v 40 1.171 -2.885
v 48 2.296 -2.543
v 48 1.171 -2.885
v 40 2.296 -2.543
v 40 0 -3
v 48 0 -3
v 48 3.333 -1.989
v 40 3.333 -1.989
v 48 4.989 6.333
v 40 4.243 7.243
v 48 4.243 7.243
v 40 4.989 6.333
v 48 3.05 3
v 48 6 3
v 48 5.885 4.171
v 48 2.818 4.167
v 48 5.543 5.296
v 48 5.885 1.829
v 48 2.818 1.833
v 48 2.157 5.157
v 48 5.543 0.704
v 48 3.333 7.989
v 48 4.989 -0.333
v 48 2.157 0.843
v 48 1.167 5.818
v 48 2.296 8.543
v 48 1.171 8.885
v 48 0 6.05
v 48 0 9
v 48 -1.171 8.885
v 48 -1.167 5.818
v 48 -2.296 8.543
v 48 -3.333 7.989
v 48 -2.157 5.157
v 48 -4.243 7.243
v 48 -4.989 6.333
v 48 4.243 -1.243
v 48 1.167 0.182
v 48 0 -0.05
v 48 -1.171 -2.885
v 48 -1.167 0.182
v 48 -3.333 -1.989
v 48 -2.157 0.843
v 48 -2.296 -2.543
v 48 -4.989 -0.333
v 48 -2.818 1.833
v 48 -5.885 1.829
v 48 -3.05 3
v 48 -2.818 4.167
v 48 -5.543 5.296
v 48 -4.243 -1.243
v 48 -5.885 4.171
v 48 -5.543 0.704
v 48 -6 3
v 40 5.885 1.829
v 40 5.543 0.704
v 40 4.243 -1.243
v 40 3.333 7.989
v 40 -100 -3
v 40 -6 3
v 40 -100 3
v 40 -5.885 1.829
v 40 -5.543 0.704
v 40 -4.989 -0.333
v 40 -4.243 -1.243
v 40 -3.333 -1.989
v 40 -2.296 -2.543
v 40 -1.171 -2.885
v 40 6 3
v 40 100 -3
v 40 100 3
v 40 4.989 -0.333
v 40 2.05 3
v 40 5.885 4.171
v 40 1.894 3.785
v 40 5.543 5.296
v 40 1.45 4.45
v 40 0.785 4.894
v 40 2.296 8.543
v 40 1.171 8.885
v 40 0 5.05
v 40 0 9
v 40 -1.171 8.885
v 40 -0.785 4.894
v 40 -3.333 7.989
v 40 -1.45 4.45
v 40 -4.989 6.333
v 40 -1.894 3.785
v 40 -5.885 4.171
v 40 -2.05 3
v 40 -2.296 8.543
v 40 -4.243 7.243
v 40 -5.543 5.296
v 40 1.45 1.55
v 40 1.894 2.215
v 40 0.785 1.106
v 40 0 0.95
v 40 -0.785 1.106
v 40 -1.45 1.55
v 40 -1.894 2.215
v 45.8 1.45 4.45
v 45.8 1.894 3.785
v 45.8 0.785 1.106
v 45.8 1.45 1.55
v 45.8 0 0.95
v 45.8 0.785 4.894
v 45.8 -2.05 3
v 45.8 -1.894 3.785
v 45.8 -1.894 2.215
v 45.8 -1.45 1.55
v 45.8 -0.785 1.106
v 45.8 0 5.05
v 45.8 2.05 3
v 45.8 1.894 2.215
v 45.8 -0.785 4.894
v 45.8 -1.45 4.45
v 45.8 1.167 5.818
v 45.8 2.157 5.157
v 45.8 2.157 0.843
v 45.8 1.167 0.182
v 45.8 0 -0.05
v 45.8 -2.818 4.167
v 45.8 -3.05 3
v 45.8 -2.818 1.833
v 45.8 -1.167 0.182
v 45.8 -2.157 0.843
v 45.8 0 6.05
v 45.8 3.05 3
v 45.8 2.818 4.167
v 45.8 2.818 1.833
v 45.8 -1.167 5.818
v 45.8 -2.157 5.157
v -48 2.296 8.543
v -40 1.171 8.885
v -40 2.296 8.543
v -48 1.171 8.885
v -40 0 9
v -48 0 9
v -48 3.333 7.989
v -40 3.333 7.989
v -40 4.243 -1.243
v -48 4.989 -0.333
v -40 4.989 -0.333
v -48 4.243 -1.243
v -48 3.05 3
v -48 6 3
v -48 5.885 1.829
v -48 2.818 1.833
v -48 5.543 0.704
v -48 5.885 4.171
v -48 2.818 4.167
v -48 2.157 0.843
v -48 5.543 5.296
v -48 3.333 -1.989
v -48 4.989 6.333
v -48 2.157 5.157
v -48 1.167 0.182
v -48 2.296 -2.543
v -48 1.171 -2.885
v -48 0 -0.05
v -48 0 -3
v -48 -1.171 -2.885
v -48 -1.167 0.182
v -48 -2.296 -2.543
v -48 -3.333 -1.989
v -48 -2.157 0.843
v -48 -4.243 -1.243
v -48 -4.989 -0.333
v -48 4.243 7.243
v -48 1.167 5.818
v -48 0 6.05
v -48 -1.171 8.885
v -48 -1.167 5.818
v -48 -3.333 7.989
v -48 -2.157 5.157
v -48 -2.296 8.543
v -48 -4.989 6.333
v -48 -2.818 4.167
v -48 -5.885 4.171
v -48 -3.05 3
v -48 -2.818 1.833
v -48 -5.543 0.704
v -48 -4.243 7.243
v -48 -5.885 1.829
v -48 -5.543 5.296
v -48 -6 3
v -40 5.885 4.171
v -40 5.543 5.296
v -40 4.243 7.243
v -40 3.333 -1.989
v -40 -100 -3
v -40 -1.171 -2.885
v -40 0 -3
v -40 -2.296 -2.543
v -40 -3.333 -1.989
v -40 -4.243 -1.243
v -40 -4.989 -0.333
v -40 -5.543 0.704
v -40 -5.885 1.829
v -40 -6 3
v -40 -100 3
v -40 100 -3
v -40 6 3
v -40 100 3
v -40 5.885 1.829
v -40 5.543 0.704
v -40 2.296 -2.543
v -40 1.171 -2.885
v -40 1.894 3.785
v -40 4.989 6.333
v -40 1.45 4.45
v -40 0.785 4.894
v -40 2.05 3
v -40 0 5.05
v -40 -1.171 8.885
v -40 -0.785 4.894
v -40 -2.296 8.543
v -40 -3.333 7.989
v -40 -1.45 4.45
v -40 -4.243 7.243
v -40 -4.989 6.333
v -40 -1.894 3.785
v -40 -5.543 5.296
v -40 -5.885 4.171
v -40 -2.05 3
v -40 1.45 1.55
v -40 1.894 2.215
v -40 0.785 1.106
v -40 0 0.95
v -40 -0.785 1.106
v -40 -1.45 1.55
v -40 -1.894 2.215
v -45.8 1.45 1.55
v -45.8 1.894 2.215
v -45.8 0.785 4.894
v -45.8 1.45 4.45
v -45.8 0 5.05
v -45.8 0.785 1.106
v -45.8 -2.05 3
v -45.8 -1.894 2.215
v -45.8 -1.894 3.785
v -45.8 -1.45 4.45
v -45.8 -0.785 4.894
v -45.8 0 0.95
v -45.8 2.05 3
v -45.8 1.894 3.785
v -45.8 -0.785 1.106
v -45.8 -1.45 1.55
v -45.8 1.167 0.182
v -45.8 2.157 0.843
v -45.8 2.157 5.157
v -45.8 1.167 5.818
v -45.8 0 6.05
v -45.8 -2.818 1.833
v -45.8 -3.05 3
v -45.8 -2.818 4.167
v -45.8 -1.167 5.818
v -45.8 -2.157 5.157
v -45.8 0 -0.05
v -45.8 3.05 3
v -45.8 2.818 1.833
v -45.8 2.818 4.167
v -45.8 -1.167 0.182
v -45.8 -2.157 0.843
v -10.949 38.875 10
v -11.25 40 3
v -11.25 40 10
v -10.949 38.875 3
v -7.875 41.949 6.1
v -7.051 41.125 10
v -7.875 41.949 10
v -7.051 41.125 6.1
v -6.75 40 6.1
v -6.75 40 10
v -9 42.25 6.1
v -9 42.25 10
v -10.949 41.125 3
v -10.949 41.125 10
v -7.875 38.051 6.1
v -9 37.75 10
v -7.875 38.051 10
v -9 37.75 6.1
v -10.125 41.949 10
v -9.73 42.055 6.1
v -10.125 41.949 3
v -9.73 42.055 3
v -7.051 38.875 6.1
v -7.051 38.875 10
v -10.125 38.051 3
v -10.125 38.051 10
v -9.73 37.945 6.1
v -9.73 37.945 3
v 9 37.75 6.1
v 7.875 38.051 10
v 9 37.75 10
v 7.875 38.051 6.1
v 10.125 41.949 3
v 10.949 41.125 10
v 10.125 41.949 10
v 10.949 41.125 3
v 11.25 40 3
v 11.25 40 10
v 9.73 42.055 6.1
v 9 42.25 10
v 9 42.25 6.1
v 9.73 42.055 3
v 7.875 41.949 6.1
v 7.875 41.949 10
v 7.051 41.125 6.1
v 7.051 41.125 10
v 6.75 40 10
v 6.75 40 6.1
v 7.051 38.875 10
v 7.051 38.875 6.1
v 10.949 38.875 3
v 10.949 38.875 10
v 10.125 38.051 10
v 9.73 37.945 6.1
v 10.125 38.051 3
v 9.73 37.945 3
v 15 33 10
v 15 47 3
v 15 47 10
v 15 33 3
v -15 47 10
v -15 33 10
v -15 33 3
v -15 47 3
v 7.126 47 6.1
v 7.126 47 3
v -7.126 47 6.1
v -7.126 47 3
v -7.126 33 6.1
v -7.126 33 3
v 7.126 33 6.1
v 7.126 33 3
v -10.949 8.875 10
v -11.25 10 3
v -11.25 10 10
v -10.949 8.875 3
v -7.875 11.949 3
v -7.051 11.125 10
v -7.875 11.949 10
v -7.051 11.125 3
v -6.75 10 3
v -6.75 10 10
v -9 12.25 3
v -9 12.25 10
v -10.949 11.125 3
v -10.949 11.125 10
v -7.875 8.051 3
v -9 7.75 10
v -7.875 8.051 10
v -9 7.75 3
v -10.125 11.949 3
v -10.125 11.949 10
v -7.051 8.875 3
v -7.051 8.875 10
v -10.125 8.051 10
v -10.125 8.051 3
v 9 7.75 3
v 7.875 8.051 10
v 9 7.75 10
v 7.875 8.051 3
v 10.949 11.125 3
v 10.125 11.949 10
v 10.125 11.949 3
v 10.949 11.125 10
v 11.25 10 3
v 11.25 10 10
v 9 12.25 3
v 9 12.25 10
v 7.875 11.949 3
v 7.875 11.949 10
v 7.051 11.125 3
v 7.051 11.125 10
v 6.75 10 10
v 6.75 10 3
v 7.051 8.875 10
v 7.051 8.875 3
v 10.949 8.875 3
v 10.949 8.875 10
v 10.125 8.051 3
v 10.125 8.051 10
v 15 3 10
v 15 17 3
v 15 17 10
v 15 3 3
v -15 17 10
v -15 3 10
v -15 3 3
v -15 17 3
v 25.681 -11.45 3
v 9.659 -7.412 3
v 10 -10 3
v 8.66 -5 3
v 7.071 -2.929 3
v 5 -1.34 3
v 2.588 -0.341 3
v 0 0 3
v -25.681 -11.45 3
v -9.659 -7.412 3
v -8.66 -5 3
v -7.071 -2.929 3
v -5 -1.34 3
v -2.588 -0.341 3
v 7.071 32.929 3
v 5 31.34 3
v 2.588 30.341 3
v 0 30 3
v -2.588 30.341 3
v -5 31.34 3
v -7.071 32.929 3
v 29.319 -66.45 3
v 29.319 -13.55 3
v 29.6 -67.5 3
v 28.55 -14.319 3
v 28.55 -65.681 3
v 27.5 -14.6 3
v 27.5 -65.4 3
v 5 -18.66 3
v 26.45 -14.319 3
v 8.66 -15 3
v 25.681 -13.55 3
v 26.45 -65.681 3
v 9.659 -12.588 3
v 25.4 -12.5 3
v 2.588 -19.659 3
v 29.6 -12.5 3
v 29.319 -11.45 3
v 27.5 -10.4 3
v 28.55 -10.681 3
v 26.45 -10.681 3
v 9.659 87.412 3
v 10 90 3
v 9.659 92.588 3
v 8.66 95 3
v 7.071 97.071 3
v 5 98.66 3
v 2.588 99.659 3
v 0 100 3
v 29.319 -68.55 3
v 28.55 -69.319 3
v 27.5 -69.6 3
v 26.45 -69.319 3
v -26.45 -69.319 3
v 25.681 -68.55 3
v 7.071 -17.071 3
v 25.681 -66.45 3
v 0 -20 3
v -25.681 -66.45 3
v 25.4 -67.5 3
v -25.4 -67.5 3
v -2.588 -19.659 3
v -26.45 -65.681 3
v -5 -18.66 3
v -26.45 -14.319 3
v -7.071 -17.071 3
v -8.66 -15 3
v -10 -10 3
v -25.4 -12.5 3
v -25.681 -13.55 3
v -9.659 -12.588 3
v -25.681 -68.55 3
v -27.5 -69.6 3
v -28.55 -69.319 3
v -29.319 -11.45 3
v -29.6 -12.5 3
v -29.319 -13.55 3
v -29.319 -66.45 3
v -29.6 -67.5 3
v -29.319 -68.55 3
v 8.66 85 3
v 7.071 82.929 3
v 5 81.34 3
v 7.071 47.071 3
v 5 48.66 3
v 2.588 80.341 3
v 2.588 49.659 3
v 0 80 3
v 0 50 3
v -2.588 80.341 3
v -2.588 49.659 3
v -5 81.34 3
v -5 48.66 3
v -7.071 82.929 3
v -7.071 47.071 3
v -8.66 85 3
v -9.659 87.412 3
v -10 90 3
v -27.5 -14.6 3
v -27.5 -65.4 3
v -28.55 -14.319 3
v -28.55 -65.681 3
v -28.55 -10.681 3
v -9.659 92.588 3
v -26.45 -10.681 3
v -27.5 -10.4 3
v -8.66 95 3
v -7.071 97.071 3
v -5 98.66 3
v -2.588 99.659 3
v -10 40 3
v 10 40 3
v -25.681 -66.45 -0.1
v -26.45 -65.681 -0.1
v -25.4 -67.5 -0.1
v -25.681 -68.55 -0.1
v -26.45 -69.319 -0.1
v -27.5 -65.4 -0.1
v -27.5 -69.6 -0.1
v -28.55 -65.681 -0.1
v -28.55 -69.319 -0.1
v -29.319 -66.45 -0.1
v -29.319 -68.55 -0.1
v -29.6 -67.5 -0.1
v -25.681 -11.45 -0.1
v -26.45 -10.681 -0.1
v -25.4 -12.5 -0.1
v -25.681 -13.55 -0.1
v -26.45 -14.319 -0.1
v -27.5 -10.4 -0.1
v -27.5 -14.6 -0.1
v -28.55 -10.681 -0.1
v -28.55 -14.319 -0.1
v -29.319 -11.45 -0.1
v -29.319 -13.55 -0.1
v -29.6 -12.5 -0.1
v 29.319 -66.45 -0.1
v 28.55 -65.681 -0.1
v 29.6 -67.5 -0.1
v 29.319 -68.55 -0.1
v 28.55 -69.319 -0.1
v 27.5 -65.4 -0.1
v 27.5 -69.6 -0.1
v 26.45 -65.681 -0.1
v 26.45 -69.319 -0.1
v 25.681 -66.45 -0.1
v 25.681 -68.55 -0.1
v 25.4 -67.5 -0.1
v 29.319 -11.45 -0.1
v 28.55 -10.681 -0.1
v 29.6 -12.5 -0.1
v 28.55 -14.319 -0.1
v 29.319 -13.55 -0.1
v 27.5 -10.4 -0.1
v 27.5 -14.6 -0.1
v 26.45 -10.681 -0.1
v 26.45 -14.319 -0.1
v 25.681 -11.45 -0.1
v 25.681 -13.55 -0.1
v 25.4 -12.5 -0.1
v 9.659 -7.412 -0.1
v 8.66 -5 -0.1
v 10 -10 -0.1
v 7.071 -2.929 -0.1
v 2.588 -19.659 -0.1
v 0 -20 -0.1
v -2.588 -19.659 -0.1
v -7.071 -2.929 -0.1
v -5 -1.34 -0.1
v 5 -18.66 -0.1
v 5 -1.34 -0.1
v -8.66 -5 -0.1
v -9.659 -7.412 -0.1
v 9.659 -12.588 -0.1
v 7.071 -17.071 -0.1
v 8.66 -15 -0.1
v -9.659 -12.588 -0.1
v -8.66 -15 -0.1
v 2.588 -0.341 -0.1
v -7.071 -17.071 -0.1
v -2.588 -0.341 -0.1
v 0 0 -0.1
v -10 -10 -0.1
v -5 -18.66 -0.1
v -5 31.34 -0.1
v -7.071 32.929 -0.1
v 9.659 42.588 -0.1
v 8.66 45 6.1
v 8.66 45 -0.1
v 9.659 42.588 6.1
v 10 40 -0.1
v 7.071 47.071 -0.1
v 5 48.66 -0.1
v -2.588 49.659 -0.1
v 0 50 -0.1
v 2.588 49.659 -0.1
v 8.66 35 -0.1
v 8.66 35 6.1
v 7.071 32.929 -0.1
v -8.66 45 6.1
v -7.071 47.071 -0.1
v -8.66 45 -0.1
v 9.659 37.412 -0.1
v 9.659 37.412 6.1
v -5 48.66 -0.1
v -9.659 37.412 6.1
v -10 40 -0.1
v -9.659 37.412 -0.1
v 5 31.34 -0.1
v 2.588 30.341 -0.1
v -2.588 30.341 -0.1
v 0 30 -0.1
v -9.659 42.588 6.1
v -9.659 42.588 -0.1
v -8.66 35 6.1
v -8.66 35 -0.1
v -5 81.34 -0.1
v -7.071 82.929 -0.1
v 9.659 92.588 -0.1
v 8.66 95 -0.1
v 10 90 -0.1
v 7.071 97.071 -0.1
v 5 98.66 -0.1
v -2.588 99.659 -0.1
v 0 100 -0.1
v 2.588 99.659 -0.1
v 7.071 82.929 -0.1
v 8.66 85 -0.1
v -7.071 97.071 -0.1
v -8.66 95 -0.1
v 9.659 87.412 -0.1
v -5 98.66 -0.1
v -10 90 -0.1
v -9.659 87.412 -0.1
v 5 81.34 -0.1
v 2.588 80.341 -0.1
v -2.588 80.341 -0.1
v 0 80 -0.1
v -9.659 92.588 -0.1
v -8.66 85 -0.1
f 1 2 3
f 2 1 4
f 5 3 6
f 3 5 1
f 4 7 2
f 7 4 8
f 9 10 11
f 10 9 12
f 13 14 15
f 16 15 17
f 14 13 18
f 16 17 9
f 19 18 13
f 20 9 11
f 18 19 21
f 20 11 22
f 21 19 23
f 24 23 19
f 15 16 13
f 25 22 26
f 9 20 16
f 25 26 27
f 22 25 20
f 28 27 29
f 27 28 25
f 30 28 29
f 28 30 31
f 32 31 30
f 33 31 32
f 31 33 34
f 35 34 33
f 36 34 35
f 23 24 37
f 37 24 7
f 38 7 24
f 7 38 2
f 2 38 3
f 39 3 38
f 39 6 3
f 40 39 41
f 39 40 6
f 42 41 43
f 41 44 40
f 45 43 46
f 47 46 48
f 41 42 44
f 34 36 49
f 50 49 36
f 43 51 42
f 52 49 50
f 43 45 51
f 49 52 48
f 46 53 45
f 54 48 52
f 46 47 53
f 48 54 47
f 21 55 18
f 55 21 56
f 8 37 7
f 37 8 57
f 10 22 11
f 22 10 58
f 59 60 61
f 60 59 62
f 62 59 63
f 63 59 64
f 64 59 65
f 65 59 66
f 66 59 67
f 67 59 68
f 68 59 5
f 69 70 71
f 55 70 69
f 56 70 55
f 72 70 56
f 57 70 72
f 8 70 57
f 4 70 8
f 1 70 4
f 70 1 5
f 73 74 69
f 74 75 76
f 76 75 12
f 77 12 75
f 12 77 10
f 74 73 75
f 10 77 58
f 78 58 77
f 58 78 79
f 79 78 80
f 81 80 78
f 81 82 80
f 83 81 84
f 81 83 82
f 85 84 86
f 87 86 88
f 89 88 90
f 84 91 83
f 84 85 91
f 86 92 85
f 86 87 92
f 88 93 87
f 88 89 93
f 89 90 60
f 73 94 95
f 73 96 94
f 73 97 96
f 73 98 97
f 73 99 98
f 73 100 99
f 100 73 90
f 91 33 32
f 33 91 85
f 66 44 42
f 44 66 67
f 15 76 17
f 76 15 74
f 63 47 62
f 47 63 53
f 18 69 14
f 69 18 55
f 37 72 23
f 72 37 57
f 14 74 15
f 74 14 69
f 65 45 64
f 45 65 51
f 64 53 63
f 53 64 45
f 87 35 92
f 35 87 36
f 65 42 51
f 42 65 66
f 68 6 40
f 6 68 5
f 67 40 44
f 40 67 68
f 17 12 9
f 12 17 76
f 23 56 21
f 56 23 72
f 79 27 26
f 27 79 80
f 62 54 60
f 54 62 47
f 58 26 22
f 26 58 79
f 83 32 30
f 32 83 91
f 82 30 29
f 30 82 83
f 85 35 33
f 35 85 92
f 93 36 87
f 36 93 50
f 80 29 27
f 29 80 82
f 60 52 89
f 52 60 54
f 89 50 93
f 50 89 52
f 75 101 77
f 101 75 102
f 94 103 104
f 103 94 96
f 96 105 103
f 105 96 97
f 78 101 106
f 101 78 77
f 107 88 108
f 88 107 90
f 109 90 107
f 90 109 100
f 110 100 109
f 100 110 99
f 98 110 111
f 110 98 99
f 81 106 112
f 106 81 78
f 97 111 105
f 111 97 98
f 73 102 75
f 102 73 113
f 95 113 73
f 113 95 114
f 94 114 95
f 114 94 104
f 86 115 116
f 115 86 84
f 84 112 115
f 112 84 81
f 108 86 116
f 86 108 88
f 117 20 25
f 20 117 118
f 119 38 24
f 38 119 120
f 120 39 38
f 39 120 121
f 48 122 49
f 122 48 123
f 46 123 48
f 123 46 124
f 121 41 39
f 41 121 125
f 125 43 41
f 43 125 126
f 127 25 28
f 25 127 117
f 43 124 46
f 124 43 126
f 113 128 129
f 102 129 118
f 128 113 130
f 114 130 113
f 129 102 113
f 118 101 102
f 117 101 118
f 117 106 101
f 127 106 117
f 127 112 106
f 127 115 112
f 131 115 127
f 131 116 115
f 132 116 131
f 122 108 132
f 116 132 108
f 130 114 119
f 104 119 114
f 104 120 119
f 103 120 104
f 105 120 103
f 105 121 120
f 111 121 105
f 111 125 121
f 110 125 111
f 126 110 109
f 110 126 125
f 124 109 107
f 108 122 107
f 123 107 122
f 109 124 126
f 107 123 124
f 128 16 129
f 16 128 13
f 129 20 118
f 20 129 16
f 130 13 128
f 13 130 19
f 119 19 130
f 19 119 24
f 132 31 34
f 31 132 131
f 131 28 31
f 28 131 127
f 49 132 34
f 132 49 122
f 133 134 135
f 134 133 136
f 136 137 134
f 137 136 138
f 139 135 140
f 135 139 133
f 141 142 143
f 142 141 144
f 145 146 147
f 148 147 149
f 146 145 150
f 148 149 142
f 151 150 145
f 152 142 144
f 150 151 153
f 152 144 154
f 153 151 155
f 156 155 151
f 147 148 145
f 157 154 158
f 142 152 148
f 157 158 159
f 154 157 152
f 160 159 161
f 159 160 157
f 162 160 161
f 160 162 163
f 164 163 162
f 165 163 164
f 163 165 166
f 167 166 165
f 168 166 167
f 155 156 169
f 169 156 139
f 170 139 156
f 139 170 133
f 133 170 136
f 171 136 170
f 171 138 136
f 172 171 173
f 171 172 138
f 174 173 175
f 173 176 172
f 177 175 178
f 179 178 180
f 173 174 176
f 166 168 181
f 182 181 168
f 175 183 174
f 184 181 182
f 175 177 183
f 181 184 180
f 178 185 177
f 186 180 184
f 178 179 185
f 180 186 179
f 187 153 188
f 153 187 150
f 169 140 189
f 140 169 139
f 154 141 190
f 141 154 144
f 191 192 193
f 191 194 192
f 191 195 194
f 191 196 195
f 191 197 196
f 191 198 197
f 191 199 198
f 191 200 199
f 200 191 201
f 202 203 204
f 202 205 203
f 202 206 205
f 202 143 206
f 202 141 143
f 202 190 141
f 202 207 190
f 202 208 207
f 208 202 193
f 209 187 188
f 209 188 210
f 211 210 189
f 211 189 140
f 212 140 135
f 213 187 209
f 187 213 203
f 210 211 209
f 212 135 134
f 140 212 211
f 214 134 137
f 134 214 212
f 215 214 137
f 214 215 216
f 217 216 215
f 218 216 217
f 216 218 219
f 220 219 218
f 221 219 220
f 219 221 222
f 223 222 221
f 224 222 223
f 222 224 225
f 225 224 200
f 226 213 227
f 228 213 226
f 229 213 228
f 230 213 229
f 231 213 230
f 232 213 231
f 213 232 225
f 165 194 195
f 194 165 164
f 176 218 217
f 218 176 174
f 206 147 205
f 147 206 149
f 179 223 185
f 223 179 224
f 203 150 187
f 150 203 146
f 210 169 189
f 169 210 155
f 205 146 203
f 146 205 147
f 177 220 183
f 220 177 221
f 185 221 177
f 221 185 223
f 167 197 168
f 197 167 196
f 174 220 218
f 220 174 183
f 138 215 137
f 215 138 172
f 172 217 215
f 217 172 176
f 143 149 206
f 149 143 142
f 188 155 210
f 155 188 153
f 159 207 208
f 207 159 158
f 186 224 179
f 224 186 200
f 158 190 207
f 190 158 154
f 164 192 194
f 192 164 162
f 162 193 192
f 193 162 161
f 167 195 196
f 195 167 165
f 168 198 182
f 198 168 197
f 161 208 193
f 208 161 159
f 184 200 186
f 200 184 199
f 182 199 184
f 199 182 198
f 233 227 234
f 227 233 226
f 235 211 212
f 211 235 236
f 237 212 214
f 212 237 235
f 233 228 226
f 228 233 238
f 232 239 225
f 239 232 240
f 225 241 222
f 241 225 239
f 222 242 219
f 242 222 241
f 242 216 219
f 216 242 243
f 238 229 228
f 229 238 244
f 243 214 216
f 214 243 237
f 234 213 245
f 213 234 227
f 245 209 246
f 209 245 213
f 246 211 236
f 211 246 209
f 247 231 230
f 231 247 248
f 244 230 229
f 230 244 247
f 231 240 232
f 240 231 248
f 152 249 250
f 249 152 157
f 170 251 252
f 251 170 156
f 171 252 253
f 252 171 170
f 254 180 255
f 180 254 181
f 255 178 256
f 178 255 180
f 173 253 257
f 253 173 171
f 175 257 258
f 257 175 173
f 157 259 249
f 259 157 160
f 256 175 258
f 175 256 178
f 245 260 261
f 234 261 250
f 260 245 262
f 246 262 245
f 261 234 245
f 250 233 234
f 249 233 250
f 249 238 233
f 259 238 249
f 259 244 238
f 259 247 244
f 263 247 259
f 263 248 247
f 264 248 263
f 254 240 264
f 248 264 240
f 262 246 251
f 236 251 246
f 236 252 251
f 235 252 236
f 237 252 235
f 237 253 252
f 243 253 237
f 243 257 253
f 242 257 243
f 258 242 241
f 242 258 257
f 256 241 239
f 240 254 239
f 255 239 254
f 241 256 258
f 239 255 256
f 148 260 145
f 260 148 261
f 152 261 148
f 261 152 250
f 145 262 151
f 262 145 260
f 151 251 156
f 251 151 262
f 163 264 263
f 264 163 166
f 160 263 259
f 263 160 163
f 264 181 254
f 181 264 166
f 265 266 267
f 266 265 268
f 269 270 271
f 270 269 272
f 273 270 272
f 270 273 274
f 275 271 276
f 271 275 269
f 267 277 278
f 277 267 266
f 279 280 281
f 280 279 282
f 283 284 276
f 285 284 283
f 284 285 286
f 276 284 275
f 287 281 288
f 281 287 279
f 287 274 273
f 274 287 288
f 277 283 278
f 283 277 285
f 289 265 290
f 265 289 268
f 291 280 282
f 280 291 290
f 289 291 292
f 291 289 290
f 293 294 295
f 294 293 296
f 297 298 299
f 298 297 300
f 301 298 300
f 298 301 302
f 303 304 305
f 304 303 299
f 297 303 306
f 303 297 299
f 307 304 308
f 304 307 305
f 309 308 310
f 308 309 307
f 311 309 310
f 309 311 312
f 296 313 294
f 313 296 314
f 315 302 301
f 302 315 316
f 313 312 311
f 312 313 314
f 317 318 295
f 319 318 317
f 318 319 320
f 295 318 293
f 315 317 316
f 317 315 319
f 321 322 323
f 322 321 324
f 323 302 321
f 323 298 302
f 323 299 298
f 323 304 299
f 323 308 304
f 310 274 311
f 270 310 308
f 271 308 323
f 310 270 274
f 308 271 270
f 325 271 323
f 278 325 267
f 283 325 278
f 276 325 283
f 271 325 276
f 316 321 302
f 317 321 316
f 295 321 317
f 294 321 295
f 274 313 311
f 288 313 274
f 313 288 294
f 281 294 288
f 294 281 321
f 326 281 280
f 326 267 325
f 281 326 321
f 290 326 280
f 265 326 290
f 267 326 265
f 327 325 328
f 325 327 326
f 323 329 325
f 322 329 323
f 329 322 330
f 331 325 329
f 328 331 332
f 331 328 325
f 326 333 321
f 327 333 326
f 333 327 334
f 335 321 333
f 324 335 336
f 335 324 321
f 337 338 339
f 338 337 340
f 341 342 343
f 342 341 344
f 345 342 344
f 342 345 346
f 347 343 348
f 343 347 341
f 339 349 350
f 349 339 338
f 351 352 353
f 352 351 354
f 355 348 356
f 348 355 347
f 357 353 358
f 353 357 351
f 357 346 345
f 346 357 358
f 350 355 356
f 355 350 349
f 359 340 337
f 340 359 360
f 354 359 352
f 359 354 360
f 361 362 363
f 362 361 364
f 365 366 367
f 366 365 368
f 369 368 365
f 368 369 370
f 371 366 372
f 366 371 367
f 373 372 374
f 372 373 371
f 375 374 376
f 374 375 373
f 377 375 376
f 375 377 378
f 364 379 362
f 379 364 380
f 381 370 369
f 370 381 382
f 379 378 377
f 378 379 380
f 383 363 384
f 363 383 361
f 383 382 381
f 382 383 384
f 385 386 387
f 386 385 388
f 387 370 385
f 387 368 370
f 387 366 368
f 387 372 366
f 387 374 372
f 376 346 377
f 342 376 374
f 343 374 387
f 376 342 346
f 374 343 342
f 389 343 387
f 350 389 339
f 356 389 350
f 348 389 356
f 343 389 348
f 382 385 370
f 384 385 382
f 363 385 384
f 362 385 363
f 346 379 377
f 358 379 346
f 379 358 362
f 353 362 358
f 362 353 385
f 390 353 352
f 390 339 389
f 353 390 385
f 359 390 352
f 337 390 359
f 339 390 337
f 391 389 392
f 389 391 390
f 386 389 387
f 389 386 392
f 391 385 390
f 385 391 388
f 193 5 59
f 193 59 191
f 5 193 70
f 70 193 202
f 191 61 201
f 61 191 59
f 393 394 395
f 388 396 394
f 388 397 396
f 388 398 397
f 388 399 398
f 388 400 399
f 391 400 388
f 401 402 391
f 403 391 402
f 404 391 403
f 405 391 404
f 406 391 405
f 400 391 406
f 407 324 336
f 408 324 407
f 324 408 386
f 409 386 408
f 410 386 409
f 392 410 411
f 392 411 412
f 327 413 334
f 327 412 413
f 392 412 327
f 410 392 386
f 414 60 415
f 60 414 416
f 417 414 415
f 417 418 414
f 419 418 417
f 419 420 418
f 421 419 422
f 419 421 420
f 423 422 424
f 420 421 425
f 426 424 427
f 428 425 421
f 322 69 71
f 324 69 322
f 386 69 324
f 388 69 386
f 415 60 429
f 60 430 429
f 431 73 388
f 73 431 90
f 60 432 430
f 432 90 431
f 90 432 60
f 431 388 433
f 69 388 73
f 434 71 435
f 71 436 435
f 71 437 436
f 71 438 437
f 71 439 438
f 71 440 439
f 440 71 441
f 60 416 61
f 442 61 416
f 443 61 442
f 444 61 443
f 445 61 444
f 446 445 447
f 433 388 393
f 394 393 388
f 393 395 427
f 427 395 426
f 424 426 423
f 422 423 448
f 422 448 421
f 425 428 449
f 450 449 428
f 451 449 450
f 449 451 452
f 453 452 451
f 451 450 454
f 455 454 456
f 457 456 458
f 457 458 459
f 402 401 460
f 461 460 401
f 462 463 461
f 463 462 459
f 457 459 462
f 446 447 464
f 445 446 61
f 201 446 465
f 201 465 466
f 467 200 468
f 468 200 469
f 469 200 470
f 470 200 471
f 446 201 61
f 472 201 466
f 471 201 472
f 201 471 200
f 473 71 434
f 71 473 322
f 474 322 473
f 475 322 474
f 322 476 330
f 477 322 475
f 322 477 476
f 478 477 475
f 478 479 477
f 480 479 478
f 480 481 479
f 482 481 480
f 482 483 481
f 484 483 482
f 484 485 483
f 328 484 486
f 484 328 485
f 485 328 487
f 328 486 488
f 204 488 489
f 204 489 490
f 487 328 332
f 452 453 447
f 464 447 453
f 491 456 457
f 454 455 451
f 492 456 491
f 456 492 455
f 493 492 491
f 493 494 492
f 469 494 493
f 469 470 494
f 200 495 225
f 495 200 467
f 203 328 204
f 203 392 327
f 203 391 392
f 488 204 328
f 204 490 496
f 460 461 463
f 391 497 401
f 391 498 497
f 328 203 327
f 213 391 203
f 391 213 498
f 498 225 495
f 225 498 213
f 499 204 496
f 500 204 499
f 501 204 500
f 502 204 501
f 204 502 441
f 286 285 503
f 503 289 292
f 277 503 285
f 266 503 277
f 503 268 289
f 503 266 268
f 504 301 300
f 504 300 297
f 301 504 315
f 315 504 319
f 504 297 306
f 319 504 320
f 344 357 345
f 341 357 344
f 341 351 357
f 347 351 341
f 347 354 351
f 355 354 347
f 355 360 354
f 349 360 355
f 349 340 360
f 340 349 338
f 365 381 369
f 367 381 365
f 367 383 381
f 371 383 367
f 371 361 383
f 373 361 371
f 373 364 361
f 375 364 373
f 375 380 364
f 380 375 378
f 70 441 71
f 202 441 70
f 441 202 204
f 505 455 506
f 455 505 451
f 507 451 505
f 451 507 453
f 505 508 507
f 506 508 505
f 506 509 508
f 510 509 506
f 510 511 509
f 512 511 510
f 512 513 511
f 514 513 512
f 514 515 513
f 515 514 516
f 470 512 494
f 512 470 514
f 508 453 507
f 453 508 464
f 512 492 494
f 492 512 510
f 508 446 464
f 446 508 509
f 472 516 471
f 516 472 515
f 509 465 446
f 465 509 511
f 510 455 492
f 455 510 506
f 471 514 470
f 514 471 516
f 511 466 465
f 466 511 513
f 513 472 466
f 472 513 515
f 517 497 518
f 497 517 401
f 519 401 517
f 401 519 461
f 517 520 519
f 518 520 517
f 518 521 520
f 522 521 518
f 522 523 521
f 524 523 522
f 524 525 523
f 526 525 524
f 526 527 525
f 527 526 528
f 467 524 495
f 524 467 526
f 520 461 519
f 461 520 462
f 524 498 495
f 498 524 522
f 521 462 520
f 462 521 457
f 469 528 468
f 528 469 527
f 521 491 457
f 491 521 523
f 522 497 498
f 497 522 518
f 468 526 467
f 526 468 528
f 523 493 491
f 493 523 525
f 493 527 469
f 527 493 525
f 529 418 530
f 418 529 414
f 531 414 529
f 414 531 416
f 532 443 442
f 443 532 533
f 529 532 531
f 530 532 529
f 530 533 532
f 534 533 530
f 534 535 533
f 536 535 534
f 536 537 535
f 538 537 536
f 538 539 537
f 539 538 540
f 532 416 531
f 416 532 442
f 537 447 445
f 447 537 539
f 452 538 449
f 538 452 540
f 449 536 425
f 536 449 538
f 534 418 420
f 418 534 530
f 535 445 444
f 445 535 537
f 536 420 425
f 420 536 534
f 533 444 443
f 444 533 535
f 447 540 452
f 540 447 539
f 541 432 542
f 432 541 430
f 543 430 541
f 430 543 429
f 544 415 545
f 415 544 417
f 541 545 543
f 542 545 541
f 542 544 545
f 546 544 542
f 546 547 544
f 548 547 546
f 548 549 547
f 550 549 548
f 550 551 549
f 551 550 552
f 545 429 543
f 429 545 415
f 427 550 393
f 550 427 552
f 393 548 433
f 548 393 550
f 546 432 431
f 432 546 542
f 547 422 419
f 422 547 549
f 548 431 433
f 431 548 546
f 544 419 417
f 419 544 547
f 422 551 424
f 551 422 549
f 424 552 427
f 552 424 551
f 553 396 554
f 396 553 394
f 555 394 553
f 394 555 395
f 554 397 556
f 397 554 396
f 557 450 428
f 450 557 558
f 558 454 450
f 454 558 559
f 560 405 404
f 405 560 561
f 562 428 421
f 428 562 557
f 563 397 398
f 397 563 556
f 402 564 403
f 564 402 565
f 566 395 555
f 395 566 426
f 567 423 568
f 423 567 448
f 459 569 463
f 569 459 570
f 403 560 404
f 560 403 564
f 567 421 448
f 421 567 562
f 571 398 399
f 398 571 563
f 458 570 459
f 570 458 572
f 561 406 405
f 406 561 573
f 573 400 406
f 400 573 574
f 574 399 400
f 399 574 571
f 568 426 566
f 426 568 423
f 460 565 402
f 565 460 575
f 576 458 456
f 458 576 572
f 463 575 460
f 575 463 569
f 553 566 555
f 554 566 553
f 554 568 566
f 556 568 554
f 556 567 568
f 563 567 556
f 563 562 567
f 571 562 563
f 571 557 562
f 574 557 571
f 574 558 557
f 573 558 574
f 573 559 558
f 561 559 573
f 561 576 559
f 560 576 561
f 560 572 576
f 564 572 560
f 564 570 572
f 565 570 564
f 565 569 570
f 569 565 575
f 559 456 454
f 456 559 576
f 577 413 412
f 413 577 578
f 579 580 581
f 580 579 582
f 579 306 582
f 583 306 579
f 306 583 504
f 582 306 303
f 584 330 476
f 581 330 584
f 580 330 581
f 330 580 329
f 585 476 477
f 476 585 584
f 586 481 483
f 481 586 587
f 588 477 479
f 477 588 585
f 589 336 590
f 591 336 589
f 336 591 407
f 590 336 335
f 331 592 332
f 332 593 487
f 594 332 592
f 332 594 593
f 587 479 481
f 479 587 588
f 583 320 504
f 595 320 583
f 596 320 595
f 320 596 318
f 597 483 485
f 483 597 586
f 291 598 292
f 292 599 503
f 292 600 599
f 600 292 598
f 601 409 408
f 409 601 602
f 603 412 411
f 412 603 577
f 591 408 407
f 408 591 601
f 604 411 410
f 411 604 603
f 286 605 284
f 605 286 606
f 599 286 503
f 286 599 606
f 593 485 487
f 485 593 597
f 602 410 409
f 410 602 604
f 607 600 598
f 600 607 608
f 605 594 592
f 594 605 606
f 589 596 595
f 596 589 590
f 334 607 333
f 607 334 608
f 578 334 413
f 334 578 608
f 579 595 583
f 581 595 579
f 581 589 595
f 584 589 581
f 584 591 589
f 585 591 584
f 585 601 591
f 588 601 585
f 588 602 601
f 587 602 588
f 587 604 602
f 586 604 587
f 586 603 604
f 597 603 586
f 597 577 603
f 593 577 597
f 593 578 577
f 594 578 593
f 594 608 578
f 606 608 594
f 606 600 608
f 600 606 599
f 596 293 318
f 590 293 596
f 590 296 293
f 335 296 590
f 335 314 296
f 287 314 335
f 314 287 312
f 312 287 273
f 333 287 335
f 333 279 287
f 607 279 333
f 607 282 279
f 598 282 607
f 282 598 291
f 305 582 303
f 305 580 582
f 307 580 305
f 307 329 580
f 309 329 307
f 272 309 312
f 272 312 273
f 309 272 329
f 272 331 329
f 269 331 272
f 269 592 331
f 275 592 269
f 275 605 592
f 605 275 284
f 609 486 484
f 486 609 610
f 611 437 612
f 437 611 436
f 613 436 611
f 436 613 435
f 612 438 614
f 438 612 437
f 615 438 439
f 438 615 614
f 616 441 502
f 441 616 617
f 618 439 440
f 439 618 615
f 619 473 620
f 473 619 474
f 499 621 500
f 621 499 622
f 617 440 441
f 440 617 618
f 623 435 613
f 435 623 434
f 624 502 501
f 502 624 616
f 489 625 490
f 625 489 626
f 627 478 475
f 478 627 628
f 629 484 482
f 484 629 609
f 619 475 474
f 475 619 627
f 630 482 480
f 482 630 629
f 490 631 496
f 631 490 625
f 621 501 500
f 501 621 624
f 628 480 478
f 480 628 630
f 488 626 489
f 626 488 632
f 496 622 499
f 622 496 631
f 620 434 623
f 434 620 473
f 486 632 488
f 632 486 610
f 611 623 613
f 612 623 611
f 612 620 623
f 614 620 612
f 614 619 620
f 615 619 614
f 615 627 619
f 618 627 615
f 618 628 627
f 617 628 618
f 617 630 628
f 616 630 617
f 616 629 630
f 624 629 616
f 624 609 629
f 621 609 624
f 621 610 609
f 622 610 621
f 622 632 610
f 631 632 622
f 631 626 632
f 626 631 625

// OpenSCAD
// ===========================================================================
// HULL-FRAME COORDINATE STANDARD - Rev R1 (2026-06-11).  See CLAUDE.md.
//   Hull frame (canonical for ALL design artifacts): X = +port (left),
//   Y = +aft (back), Z = +dorsal (up); origin = SerenityAssembly.FCStd
//   world origin.  Primary-component STLs published to airframe/stls/
//   are stored directly in hull frame, baked by tools/bake_hull_frame.py
//   (marker 'SerenityUAV HULL-FRAME R1' in the binary STL header).
//   NEVER re-bake a mesh derived from an already-baked file.
//   This file:
//     Malcolm ground-support equipment - part-local print frame.  The
//     aircraft hull-frame standard does not apply to GCS hardware
//     (documented exception, like the avionics KiCad files).
// ===========================================================================
/*
 * malcolm_gimbal_mount.scad
 * Antenna mounting plate for Malcolm GCS directional antenna gimbal
 *
 * Author:  Steve Griffing, PE(CSE), CISSP-ISSEP, CPP
 * License: CC BY 4.0 — creativecommons.org/licenses/by/4.0
 * Revision: Q1 (2026-06-10)
 *
 * Description:
 *   CF-PETG mounting plate that carries the 9 dBi 915 MHz Yagi (for SiK+LoRa)
 *   and the 14 dBi 5 GHz WiFi flat panel antenna on the tilt stage pivot.
 *   The plate pivots on the 4 mm CF rod through the tilt yoke MF104ZZ bearings.
 *
 *   Antenna layout (looking aft along antenna bore-sight):
 *     - Yagi:  centre of plate, top half; M4 U-bolt clamps at two points
 *     - Panel: centre of plate, lower half; 4× M4 threads at panel corners
 *
 *   Pivot boss: 4 mm bore CF rod, flanged hub at each end of the plate
 *   that slides over the MF104ZZ inner races.
 *
 *   Diametrically-magnetised disc magnet (6×2 mm, N42) pressed into pivot
 *   hub end-face for AS5600 encoder reading.
 *
 * Material: CF-PETG, 0.15 mm layers, 40% infill, 4 perimeters
 *
 * Mesh verification: run after every geometry change.
 *   openscad -o malcolm_gimbal_mount.stl malcolm_gimbal_mount.scad
 *   python3 tools/validate_stls.py
 */

/* ---------------------------------------------------------------------------
 * Plate geometry
 * ---------------------------------------------------------------------------*/
PLATE_W     = 80.0;  /* Plate total width (pivot axis span) mm             */
PLATE_H     = 200.0; /* Plate height mm — tall enough for both antennas     */
PLATE_T     = 6.0;   /* Plate thickness mm (CF-PETG structural)             */
CORNER_R    = 4.0;   /* Corner radius mm                                    */

/* ---------------------------------------------------------------------------
 * Pivot boss (flanged hub, one each end of pivot axis)
 * ---------------------------------------------------------------------------*/
HUB_OD      = 12.0;  /* Hub outer diameter mm (press onto MF104ZZ inner race) */
HUB_ID      = 4.1;   /* CF rod slip-fit bore mm (4.0 mm rod + 0.1 clearance) */
HUB_L       = 8.0;   /* Hub axial length mm                                  */
MAGNET_D    = 6.1;   /* Encoder magnet pocket diameter mm (6 mm disc + 0.1)  */
MAGNET_H    = 2.2;   /* Encoder magnet pocket depth mm (2 mm disc + 0.2)     */

/* ---------------------------------------------------------------------------
 * Yagi antenna clamp positions (U-bolt pattern, two stations along plate)
 * Yagi boom diameter assumed 15 mm (adjust UBOLT_D if different)
 * ---------------------------------------------------------------------------*/
UBOLT_D         = 15.5; /* U-bolt inner span mm (boom OD + 0.5 clearance)   */
UBOLT_HOLE_D    = 4.5;  /* U-bolt threaded rod clearance hole mm (M4)       */
UBOLT_PITCH     = 18.0; /* U-bolt leg centre-to-centre mm (M4 U-bolt 15mm span) */
YAGI_STATION_1  = PLATE_H / 2 + 40; /* Upper clamp Y position from plate centre mm */
YAGI_STATION_2  = PLATE_H / 2 + 10; /* Lower clamp Y position from plate centre mm */

/* ---------------------------------------------------------------------------
 * WiFi panel mounting (4× M4 holes in 55×55 mm pattern — standard VESA-like)
 * ---------------------------------------------------------------------------*/
PANEL_MOUNT_PITCH = 55.0; /* Panel mounting hole pitch (square) mm         */
PANEL_HOLE_D      = 4.2;  /* M4 clearance mm                               */
PANEL_Y_OFFSET    = -40.0;/* Panel centre offset from plate centre Y mm    */

/* ===========================================================================
 * Modules
 * ===========================================================================*/

module pivot_hub(side) {
    /*
     * Flanged pivot hub at one end of the plate (side = +1 port, -1 stbd).
     * Hub extends beyond the plate face; magnet pocket in the outer face.
     */
    translate([side * PLATE_W / 2, 0, PLATE_T / 2]) {
        rotate([0, 90 * side, 0]) {
            difference() {
                cylinder(d = HUB_OD, h = HUB_L, $fn = 32);
                /* CF rod bore */
                translate([0, 0, -0.1]) {
                    cylinder(d = HUB_ID, h = HUB_L + 0.2, $fn = 16);
                }
                /* Encoder magnet pocket in outer face */
                translate([0, 0, HUB_L - MAGNET_H]) {
                    cylinder(d = MAGNET_D, h = MAGNET_H + 0.1, $fn = 16);
                }
            }
        }
    }
}

module ubolt_clamp_plate(y_pos) {
    /*
     * Reinforcing boss at each U-bolt clamp station.
     * Includes two M4 clearance holes for U-bolt legs.
     */
    translate([0, y_pos, PLATE_T]) {
        difference() {
            cube([UBOLT_PITCH + 12, 14, 8], center = true);
            for (xi = [-1, 1]) {
                translate([xi * UBOLT_PITCH / 2, 0, -4.1]) {
                    cylinder(d = UBOLT_HOLE_D, h = 9, $fn = 12);
                }
            }
        }
    }
}

module mount_plate() {
    /*
     * Complete antenna mounting plate with pivot hubs, clamp bosses, and
     * WiFi panel mounting holes.
     */
    difference() {
        union() {
            /* Main plate */
            hull() {
                for (xi = [-1, 1]) {
                    for (yi = [-1, 1]) {
                        translate([xi * (PLATE_W / 2 - CORNER_R),
                                   yi * (PLATE_H / 2 - CORNER_R), 0]) {
                            cube([CORNER_R * 2, CORNER_R * 2, PLATE_T], center = true);
                        }
                    }
                }
            }

            /* Pivot hubs at plate ends */
            pivot_hub(+1);
            pivot_hub(-1);

            /* U-bolt clamp bosses for Yagi */
            ubolt_clamp_plate(PLATE_H / 2 - (PLATE_H - YAGI_STATION_1));
            ubolt_clamp_plate(PLATE_H / 2 - (PLATE_H - YAGI_STATION_2));
        }

        /* WiFi panel M4 mounting holes — 4× at PANEL_MOUNT_PITCH square pattern */
        for (xi = [-1, 1]) {
            for (yi = [-1, 1]) {
                translate([xi * PANEL_MOUNT_PITCH / 2,
                           PANEL_Y_OFFSET + yi * PANEL_MOUNT_PITCH / 2,
                           -0.1]) {
                    cylinder(d = PANEL_HOLE_D, h = PLATE_T + 0.2, $fn = 12);
                }
            }
        }

        /* Weight-reduction lightening holes — 3× on upper half, 2× on lower */
        for (yi = [0.25, 0.5, 0.75]) {
            translate([0, PLATE_H * yi - PLATE_H / 2 + 40, -0.1]) {
                cylinder(d = 20, h = PLATE_T + 0.2, $fn = 24);
            }
        }
    }
}

mount_plate();
